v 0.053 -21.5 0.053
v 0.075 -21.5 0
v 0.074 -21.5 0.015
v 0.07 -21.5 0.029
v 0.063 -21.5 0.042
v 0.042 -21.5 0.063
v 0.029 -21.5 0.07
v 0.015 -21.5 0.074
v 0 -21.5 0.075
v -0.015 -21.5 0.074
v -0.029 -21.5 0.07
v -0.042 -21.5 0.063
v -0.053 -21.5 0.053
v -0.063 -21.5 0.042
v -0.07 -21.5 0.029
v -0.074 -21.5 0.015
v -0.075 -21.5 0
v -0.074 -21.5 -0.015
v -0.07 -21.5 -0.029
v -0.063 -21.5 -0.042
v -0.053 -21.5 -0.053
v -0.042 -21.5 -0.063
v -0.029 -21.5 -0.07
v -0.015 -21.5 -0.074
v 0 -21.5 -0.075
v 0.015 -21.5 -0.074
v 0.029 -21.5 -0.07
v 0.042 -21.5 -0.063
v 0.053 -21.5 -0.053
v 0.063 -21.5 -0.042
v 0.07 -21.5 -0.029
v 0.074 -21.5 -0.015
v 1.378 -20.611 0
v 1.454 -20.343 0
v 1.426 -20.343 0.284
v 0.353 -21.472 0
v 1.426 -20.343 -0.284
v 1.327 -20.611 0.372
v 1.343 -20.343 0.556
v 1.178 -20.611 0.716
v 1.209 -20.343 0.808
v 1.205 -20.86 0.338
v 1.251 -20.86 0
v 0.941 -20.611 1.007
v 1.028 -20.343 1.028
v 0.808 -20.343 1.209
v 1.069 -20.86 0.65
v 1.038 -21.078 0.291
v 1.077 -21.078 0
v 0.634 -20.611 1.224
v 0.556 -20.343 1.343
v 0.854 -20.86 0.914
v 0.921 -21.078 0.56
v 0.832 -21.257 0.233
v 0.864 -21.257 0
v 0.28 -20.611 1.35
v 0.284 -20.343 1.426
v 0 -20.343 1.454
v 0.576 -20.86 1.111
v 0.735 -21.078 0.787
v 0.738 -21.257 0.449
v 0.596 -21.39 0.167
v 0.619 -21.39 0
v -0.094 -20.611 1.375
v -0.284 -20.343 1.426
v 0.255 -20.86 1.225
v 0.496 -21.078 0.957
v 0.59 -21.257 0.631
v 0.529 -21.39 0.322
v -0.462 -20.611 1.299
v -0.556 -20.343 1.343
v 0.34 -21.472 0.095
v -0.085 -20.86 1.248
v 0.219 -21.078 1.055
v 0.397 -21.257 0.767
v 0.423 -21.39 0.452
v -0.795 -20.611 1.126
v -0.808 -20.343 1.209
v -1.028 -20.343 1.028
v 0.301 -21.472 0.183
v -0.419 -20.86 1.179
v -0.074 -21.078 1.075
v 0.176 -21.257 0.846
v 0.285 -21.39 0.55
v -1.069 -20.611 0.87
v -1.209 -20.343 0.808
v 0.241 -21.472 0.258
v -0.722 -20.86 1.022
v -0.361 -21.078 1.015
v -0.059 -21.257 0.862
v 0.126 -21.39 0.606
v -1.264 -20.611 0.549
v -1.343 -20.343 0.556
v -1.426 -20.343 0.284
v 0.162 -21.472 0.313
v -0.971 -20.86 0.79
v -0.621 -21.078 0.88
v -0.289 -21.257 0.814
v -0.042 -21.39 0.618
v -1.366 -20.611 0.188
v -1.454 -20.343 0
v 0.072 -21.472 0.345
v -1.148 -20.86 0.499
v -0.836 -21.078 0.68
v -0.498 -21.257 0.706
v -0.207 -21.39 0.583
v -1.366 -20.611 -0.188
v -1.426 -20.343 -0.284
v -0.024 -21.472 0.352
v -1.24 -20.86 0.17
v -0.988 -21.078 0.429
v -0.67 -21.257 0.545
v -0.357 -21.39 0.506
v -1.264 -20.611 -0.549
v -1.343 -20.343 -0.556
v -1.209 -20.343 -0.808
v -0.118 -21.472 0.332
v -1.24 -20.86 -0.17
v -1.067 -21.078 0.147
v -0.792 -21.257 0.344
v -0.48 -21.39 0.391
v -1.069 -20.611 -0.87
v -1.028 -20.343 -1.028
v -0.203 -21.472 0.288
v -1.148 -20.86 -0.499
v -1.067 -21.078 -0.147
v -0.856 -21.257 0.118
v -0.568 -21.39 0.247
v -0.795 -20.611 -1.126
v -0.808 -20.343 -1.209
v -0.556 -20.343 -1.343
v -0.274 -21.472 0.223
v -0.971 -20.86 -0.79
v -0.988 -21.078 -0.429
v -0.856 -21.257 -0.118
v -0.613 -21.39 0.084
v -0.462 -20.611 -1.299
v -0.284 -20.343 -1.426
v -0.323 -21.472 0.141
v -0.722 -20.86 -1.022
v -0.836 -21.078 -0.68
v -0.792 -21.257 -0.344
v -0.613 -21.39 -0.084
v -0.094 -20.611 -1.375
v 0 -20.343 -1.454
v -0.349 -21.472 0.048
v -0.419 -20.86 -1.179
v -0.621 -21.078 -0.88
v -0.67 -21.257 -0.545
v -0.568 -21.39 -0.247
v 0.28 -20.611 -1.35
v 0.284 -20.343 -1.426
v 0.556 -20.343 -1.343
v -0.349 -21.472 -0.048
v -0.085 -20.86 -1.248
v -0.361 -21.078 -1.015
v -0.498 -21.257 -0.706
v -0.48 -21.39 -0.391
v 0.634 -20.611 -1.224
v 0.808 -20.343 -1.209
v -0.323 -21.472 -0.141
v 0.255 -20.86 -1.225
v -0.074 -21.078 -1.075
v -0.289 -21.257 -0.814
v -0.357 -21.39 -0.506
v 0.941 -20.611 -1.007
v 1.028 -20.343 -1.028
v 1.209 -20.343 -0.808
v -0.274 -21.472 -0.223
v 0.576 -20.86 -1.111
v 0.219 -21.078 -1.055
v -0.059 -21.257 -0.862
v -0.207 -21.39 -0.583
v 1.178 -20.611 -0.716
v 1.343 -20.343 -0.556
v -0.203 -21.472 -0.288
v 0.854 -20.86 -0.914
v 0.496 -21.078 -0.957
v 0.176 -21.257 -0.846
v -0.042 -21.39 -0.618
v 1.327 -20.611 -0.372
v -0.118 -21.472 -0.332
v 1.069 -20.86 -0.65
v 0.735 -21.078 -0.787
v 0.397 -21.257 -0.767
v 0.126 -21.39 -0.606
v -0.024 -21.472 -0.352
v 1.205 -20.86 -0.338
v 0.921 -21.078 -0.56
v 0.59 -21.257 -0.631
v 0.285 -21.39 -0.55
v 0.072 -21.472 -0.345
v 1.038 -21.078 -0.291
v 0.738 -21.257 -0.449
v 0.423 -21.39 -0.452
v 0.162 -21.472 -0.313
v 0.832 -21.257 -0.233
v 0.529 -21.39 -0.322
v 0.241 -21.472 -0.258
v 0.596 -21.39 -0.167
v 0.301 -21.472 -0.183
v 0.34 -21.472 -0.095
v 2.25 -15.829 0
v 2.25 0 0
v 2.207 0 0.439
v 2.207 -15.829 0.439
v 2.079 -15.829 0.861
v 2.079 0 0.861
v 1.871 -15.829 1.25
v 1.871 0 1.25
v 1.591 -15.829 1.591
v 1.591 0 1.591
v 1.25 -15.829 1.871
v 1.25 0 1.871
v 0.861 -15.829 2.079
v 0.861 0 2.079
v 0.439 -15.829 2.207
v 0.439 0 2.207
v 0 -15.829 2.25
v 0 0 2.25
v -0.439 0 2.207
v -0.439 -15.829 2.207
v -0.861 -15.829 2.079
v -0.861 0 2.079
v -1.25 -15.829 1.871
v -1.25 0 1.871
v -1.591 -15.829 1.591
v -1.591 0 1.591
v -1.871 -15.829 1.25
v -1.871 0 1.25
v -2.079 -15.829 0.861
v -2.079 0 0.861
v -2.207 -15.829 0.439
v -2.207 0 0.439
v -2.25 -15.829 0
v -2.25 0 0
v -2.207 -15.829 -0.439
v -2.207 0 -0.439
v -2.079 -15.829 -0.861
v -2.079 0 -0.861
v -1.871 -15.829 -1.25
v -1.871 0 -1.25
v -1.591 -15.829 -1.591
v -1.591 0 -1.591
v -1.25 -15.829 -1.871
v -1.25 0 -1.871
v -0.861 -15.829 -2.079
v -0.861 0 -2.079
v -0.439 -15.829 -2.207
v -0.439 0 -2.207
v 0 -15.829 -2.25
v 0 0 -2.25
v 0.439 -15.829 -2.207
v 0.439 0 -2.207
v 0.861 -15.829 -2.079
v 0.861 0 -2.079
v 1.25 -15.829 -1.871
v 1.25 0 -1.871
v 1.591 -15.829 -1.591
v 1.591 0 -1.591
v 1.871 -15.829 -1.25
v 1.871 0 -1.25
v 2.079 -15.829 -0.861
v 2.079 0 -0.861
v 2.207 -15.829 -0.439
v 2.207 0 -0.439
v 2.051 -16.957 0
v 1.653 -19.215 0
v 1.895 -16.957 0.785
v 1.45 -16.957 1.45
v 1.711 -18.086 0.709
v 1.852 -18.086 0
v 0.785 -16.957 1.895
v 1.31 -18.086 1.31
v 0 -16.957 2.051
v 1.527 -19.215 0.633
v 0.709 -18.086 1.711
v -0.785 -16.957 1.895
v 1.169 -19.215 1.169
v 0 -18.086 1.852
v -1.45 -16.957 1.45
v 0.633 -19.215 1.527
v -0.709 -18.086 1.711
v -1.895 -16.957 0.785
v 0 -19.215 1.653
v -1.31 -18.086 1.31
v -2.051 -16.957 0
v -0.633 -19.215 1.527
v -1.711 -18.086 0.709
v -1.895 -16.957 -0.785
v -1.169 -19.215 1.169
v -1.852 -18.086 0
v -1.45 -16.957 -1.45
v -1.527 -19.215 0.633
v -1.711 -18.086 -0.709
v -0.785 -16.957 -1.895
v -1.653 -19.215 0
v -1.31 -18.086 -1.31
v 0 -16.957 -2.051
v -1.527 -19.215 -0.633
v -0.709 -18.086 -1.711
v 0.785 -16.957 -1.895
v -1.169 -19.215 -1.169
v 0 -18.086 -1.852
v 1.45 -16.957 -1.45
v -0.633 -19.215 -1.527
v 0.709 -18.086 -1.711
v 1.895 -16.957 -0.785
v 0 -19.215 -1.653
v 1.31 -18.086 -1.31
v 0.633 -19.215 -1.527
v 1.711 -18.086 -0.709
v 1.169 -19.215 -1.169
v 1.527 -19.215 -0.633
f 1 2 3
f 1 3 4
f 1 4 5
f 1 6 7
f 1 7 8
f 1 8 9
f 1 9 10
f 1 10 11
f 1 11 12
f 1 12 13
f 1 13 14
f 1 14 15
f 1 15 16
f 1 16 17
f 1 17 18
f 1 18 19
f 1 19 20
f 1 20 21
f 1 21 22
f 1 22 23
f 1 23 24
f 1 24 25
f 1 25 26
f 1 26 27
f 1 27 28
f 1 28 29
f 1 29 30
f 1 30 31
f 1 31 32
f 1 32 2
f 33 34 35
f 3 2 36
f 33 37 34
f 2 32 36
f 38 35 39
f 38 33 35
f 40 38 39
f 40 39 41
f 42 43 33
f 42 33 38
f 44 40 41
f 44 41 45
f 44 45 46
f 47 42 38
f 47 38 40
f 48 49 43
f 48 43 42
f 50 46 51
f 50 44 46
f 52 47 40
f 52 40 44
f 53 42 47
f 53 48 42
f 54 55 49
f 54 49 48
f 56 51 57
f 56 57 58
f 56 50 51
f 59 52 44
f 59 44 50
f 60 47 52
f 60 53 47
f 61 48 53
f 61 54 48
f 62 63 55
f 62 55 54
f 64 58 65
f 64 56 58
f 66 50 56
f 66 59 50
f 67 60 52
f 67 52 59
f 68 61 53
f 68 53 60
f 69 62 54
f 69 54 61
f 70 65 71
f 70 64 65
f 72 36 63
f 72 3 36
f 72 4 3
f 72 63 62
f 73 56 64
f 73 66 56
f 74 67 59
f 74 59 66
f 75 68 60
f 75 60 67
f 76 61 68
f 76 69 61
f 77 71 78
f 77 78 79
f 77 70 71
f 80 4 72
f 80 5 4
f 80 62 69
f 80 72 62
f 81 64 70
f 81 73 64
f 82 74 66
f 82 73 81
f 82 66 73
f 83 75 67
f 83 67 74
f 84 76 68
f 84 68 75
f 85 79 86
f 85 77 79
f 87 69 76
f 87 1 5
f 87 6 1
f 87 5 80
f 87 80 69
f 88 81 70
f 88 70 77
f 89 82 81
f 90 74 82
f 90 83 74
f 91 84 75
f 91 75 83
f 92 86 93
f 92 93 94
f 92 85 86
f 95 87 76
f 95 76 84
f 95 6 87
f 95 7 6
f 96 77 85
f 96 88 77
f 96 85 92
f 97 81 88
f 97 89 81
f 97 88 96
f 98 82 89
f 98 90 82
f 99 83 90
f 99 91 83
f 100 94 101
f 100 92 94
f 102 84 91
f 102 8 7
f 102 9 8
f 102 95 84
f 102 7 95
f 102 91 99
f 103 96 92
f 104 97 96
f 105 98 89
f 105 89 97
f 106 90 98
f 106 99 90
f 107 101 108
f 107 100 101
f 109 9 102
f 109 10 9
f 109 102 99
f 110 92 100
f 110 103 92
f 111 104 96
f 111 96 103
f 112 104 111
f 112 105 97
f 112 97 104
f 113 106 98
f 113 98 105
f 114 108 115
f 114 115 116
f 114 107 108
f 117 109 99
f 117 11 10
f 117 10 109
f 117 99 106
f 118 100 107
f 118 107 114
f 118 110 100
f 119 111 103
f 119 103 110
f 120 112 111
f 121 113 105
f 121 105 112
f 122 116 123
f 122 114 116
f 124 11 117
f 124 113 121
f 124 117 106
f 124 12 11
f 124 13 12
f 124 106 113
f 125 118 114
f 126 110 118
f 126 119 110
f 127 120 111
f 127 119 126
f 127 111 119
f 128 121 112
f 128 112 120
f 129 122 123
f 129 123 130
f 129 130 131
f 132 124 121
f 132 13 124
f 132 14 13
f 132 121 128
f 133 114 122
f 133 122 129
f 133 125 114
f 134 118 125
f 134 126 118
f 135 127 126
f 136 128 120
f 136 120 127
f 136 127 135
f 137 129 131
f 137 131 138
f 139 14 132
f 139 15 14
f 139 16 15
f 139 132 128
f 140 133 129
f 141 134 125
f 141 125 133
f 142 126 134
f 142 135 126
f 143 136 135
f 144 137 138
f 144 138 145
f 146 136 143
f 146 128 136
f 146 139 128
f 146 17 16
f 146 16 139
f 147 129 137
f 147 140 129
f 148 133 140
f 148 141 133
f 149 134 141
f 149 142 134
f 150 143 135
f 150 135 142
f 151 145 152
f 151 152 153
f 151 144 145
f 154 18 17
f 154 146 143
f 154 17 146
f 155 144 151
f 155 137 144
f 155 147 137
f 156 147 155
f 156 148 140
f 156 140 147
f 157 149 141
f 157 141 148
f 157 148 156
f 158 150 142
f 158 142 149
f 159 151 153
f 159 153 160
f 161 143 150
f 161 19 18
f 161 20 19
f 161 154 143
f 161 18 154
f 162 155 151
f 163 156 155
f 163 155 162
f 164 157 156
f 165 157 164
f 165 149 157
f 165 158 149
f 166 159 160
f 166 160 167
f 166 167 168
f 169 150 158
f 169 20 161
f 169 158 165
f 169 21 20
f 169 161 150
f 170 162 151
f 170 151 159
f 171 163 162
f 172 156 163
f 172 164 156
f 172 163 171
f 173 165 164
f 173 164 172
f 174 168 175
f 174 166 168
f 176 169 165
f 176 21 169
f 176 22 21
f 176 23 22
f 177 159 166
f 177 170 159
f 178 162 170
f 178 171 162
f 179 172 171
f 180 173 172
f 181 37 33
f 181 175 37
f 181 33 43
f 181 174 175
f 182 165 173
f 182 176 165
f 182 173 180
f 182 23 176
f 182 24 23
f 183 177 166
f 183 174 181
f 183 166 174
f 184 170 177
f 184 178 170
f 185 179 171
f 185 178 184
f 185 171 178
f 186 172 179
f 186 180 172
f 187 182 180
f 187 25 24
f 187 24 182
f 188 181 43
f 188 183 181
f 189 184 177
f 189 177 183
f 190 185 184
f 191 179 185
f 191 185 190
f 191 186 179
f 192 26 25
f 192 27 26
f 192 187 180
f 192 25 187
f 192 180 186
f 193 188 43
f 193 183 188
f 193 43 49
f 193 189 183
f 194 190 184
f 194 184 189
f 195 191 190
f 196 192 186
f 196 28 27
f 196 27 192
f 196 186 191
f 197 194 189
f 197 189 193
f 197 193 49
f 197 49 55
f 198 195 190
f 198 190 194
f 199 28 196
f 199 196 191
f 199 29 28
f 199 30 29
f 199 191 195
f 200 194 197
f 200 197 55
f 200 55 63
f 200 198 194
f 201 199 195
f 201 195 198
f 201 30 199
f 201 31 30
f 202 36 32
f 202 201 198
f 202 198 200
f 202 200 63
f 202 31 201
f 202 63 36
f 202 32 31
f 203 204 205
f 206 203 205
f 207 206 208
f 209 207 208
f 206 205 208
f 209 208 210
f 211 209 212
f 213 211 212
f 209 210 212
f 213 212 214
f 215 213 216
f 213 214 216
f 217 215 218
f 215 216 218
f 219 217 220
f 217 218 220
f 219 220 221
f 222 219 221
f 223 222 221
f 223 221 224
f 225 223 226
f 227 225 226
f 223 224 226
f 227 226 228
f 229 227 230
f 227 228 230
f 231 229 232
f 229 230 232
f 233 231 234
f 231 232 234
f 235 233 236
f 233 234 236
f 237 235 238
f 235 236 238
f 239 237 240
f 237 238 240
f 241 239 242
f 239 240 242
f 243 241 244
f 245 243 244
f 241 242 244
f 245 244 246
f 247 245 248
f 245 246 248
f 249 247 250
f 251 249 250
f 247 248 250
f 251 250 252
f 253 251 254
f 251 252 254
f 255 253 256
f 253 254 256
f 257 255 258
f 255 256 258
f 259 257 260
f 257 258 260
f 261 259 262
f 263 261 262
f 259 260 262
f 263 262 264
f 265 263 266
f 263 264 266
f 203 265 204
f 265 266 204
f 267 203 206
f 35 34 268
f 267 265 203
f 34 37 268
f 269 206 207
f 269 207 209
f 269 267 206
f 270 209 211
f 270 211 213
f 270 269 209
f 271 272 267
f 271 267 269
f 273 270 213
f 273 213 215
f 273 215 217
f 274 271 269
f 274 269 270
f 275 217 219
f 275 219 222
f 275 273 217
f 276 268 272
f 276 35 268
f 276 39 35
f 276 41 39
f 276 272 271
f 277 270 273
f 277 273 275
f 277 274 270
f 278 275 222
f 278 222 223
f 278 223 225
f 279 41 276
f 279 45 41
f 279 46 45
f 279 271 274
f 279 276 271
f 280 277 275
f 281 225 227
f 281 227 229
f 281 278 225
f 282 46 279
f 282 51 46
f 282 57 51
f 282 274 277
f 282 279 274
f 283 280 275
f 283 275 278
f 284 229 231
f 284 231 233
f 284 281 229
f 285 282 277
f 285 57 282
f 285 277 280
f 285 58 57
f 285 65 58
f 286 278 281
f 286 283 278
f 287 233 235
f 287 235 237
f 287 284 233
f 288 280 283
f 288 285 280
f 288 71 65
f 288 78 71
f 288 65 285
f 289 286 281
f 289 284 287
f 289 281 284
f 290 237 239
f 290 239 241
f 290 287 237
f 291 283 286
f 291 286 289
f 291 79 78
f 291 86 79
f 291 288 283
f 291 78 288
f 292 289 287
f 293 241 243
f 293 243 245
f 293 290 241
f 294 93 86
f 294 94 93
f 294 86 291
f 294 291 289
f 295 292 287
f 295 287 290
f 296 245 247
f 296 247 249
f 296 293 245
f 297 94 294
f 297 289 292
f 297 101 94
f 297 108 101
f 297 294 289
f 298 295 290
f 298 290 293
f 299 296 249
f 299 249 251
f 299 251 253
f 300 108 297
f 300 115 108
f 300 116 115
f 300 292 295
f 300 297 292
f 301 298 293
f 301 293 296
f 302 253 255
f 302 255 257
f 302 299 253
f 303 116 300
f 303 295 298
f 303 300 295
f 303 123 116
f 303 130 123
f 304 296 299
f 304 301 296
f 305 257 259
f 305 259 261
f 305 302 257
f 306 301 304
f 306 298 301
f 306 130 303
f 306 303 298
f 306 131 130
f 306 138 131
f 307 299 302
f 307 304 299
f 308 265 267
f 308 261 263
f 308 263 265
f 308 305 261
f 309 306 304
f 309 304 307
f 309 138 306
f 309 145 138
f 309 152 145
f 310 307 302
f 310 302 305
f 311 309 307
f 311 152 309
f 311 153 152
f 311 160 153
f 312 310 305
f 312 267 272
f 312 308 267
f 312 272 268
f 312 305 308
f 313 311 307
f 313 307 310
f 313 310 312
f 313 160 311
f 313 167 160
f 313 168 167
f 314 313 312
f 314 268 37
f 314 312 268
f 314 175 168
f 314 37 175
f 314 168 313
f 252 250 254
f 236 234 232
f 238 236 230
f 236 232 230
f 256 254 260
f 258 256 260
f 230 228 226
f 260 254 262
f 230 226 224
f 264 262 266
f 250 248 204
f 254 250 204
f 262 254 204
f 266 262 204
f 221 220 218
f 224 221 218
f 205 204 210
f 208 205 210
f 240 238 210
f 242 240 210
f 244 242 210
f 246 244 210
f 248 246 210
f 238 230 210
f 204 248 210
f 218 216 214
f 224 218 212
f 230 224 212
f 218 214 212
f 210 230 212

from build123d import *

# Parameters (mm, degrees)
F0_R     = 2.25
F1_DEPTH = 21.5
F2_SIZE2 = 1
F2_SIZE  = 5.6712818196
F3_R     = 1.4


with BuildPart() as f1:
    # F0 (on Front) → F1 (new body)
    with BuildSketch(Plane.XZ):
        Circle(F0_R)
    extrude(amount=F1_DEPTH)

    # F2
    f2_edges = [f1.edges().sort_by_distance(p)[0] for p in [
        (-2.25, -21.5, 0),
    ]]
    f2_side = f1.faces().sort_by_distance((-2.25, -10.75, 0))[0]
    chamfer(f2_edges, length=F2_SIZE, length2=F2_SIZE2, reference=f2_side)

    # F3
    f3_edges = [f1.edges().sort_by_distance(p)[0] for p in [
        (-1.25, -21.5, 0),
    ]]
    fillet(f3_edges, radius=F3_R)


solid = f1.part
